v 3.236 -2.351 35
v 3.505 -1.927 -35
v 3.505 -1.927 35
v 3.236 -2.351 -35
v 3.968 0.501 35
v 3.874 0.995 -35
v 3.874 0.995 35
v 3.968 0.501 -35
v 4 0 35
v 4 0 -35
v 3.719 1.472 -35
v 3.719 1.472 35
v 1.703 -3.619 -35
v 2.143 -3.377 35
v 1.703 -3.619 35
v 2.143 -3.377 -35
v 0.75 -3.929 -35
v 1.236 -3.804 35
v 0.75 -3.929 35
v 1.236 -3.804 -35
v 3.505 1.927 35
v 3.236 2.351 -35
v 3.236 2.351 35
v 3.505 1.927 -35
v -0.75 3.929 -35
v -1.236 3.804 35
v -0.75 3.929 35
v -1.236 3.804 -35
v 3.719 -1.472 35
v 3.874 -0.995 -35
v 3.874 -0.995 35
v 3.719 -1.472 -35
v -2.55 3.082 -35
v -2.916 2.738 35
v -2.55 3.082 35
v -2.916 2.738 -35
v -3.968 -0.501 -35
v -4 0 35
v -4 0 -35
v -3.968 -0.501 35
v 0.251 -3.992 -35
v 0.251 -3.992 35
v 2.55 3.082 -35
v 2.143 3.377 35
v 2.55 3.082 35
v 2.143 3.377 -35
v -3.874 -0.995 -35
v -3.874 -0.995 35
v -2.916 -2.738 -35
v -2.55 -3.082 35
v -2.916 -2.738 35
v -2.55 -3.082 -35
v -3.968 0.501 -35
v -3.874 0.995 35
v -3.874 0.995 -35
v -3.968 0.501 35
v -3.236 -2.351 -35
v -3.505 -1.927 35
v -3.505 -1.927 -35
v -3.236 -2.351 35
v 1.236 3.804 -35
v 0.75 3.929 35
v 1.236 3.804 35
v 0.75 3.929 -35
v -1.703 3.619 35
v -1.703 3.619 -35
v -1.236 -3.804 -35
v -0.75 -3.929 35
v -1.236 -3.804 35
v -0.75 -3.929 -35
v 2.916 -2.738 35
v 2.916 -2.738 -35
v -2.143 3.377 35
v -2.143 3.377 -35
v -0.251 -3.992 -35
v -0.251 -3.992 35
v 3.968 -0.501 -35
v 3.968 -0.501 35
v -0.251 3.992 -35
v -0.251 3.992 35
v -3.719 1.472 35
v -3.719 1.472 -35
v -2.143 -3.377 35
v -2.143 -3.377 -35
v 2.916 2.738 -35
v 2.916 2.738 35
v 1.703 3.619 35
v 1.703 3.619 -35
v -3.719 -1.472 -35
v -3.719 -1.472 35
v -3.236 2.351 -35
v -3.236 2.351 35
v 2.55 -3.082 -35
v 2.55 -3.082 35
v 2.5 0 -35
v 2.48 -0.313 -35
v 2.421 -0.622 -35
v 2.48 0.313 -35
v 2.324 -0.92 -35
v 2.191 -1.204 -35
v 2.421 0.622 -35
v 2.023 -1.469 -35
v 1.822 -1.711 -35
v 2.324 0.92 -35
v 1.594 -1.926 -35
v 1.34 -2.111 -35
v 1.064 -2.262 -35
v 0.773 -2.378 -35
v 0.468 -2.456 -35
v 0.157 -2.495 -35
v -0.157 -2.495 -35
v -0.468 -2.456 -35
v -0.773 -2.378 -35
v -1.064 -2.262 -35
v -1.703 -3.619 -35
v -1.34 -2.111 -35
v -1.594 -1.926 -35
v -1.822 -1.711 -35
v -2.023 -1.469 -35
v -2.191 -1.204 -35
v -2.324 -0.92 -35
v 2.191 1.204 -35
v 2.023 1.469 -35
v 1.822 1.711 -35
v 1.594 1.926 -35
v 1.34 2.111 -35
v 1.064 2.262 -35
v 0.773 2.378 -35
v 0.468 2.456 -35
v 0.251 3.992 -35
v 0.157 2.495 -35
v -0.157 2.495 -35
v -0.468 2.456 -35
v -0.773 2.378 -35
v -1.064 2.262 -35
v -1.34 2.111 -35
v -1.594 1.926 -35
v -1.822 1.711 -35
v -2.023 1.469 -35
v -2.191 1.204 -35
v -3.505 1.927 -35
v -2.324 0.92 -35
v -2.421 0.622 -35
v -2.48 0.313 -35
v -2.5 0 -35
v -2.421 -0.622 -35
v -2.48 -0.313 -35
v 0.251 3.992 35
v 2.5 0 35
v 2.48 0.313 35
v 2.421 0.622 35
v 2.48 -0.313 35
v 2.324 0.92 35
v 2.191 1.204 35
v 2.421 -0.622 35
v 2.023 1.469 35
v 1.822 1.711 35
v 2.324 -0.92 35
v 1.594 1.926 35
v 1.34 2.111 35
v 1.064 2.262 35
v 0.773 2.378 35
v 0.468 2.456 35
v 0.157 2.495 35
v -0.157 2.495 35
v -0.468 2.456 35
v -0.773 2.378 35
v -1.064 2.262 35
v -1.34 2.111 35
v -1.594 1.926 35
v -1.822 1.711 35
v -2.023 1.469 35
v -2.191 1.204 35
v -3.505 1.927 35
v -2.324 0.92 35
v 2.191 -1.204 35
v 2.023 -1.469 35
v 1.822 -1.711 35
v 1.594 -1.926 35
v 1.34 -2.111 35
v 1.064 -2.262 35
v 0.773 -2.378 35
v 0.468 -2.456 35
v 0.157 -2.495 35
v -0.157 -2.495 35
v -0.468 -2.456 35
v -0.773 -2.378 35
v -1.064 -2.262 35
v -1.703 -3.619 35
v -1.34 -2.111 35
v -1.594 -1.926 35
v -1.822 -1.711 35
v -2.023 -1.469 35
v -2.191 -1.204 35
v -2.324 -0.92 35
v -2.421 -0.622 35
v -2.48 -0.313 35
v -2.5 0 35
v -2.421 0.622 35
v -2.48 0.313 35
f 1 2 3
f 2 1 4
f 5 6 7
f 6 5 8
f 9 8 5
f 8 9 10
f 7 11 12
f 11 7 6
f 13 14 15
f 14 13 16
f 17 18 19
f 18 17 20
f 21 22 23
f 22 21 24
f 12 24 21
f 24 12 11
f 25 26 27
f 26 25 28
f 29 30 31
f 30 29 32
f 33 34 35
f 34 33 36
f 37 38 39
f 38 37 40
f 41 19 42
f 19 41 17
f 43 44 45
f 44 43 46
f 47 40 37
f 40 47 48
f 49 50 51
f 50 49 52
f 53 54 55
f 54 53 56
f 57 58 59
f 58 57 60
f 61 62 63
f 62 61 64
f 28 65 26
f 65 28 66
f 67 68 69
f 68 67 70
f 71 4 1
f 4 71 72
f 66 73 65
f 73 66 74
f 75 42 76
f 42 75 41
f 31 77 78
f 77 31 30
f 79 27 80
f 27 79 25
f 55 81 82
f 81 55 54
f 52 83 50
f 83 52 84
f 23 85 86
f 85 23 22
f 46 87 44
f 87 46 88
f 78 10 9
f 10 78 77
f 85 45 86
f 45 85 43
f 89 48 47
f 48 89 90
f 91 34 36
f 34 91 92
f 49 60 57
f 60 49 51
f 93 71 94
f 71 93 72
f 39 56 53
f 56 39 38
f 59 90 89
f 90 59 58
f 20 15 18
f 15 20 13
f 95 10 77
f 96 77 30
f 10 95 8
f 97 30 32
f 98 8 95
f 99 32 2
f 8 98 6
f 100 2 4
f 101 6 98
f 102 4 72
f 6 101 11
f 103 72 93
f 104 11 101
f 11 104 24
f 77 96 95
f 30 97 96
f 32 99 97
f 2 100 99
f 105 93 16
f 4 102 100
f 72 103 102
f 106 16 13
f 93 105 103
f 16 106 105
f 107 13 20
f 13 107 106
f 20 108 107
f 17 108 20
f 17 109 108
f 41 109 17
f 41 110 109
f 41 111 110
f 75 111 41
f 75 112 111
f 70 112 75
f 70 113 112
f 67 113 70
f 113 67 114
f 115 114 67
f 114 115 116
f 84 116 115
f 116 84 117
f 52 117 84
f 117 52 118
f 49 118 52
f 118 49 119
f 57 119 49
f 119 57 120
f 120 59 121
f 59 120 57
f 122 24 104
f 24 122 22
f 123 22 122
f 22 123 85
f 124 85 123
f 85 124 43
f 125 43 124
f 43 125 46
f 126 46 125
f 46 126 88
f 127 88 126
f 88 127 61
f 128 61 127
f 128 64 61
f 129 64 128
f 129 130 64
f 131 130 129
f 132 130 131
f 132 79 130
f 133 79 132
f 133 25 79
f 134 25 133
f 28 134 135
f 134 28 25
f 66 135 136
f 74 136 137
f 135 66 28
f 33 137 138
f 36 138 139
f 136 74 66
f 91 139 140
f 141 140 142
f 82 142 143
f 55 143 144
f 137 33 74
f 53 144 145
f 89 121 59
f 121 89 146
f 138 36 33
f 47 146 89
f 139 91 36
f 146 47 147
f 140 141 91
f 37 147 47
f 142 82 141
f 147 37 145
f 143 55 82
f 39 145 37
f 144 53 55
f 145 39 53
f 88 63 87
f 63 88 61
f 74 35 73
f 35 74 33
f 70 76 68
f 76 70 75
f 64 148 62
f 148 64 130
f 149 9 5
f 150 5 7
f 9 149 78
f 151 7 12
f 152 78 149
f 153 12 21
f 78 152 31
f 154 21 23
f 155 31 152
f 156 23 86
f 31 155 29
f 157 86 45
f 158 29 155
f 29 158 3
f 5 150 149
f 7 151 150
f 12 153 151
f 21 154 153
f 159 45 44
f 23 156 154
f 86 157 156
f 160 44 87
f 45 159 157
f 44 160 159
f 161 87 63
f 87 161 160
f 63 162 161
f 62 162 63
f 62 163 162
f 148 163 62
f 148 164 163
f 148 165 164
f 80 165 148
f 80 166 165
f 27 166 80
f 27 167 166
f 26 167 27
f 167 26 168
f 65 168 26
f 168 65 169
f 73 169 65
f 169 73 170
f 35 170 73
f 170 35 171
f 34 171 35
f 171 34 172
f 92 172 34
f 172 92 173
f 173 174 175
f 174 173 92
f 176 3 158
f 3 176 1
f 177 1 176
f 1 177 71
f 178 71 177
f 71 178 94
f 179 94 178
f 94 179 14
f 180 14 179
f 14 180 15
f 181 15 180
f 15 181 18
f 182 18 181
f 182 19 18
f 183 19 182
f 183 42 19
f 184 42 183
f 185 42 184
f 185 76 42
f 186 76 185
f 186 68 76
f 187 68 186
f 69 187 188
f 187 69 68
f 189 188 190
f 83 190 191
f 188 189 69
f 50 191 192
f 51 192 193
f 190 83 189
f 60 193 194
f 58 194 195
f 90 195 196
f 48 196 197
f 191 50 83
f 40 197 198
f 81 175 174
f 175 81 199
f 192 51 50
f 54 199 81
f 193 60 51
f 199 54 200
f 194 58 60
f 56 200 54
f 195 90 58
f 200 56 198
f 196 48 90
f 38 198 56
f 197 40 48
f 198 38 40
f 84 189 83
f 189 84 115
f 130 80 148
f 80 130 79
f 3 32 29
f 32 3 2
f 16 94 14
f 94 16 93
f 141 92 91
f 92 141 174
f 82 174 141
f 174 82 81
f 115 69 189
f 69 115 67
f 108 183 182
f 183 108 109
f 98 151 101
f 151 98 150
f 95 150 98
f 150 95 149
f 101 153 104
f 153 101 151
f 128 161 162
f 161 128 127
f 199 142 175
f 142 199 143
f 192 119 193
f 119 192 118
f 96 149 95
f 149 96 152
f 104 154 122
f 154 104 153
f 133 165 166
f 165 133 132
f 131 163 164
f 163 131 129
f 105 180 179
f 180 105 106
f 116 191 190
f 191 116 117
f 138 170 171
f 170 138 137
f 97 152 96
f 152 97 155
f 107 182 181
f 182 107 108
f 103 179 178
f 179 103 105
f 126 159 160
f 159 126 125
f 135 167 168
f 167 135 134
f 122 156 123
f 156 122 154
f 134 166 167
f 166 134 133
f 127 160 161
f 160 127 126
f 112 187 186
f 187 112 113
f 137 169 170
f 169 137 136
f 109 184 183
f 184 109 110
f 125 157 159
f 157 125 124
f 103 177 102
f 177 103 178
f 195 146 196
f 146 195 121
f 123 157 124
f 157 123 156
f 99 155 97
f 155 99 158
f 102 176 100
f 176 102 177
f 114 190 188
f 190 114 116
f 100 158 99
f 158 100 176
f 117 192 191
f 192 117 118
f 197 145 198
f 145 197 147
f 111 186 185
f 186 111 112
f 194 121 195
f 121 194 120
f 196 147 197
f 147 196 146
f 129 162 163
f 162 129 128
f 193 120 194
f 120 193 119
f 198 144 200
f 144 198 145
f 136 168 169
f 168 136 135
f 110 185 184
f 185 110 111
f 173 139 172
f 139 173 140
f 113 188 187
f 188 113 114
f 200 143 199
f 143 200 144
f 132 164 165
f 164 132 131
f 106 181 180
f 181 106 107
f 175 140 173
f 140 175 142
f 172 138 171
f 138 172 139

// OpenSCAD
$fn = 50;


difference() {
	union() {
		translate(v = [0, 0, -35.0000000000]) {
			cylinder(h = 70, r = 4.0000000000);
		}
	}
	union() {
		translate(v = [0, 0, -100.0000000000]) {
			cylinder(h = 200, r = 2.5000000000);
		}
	}
}
